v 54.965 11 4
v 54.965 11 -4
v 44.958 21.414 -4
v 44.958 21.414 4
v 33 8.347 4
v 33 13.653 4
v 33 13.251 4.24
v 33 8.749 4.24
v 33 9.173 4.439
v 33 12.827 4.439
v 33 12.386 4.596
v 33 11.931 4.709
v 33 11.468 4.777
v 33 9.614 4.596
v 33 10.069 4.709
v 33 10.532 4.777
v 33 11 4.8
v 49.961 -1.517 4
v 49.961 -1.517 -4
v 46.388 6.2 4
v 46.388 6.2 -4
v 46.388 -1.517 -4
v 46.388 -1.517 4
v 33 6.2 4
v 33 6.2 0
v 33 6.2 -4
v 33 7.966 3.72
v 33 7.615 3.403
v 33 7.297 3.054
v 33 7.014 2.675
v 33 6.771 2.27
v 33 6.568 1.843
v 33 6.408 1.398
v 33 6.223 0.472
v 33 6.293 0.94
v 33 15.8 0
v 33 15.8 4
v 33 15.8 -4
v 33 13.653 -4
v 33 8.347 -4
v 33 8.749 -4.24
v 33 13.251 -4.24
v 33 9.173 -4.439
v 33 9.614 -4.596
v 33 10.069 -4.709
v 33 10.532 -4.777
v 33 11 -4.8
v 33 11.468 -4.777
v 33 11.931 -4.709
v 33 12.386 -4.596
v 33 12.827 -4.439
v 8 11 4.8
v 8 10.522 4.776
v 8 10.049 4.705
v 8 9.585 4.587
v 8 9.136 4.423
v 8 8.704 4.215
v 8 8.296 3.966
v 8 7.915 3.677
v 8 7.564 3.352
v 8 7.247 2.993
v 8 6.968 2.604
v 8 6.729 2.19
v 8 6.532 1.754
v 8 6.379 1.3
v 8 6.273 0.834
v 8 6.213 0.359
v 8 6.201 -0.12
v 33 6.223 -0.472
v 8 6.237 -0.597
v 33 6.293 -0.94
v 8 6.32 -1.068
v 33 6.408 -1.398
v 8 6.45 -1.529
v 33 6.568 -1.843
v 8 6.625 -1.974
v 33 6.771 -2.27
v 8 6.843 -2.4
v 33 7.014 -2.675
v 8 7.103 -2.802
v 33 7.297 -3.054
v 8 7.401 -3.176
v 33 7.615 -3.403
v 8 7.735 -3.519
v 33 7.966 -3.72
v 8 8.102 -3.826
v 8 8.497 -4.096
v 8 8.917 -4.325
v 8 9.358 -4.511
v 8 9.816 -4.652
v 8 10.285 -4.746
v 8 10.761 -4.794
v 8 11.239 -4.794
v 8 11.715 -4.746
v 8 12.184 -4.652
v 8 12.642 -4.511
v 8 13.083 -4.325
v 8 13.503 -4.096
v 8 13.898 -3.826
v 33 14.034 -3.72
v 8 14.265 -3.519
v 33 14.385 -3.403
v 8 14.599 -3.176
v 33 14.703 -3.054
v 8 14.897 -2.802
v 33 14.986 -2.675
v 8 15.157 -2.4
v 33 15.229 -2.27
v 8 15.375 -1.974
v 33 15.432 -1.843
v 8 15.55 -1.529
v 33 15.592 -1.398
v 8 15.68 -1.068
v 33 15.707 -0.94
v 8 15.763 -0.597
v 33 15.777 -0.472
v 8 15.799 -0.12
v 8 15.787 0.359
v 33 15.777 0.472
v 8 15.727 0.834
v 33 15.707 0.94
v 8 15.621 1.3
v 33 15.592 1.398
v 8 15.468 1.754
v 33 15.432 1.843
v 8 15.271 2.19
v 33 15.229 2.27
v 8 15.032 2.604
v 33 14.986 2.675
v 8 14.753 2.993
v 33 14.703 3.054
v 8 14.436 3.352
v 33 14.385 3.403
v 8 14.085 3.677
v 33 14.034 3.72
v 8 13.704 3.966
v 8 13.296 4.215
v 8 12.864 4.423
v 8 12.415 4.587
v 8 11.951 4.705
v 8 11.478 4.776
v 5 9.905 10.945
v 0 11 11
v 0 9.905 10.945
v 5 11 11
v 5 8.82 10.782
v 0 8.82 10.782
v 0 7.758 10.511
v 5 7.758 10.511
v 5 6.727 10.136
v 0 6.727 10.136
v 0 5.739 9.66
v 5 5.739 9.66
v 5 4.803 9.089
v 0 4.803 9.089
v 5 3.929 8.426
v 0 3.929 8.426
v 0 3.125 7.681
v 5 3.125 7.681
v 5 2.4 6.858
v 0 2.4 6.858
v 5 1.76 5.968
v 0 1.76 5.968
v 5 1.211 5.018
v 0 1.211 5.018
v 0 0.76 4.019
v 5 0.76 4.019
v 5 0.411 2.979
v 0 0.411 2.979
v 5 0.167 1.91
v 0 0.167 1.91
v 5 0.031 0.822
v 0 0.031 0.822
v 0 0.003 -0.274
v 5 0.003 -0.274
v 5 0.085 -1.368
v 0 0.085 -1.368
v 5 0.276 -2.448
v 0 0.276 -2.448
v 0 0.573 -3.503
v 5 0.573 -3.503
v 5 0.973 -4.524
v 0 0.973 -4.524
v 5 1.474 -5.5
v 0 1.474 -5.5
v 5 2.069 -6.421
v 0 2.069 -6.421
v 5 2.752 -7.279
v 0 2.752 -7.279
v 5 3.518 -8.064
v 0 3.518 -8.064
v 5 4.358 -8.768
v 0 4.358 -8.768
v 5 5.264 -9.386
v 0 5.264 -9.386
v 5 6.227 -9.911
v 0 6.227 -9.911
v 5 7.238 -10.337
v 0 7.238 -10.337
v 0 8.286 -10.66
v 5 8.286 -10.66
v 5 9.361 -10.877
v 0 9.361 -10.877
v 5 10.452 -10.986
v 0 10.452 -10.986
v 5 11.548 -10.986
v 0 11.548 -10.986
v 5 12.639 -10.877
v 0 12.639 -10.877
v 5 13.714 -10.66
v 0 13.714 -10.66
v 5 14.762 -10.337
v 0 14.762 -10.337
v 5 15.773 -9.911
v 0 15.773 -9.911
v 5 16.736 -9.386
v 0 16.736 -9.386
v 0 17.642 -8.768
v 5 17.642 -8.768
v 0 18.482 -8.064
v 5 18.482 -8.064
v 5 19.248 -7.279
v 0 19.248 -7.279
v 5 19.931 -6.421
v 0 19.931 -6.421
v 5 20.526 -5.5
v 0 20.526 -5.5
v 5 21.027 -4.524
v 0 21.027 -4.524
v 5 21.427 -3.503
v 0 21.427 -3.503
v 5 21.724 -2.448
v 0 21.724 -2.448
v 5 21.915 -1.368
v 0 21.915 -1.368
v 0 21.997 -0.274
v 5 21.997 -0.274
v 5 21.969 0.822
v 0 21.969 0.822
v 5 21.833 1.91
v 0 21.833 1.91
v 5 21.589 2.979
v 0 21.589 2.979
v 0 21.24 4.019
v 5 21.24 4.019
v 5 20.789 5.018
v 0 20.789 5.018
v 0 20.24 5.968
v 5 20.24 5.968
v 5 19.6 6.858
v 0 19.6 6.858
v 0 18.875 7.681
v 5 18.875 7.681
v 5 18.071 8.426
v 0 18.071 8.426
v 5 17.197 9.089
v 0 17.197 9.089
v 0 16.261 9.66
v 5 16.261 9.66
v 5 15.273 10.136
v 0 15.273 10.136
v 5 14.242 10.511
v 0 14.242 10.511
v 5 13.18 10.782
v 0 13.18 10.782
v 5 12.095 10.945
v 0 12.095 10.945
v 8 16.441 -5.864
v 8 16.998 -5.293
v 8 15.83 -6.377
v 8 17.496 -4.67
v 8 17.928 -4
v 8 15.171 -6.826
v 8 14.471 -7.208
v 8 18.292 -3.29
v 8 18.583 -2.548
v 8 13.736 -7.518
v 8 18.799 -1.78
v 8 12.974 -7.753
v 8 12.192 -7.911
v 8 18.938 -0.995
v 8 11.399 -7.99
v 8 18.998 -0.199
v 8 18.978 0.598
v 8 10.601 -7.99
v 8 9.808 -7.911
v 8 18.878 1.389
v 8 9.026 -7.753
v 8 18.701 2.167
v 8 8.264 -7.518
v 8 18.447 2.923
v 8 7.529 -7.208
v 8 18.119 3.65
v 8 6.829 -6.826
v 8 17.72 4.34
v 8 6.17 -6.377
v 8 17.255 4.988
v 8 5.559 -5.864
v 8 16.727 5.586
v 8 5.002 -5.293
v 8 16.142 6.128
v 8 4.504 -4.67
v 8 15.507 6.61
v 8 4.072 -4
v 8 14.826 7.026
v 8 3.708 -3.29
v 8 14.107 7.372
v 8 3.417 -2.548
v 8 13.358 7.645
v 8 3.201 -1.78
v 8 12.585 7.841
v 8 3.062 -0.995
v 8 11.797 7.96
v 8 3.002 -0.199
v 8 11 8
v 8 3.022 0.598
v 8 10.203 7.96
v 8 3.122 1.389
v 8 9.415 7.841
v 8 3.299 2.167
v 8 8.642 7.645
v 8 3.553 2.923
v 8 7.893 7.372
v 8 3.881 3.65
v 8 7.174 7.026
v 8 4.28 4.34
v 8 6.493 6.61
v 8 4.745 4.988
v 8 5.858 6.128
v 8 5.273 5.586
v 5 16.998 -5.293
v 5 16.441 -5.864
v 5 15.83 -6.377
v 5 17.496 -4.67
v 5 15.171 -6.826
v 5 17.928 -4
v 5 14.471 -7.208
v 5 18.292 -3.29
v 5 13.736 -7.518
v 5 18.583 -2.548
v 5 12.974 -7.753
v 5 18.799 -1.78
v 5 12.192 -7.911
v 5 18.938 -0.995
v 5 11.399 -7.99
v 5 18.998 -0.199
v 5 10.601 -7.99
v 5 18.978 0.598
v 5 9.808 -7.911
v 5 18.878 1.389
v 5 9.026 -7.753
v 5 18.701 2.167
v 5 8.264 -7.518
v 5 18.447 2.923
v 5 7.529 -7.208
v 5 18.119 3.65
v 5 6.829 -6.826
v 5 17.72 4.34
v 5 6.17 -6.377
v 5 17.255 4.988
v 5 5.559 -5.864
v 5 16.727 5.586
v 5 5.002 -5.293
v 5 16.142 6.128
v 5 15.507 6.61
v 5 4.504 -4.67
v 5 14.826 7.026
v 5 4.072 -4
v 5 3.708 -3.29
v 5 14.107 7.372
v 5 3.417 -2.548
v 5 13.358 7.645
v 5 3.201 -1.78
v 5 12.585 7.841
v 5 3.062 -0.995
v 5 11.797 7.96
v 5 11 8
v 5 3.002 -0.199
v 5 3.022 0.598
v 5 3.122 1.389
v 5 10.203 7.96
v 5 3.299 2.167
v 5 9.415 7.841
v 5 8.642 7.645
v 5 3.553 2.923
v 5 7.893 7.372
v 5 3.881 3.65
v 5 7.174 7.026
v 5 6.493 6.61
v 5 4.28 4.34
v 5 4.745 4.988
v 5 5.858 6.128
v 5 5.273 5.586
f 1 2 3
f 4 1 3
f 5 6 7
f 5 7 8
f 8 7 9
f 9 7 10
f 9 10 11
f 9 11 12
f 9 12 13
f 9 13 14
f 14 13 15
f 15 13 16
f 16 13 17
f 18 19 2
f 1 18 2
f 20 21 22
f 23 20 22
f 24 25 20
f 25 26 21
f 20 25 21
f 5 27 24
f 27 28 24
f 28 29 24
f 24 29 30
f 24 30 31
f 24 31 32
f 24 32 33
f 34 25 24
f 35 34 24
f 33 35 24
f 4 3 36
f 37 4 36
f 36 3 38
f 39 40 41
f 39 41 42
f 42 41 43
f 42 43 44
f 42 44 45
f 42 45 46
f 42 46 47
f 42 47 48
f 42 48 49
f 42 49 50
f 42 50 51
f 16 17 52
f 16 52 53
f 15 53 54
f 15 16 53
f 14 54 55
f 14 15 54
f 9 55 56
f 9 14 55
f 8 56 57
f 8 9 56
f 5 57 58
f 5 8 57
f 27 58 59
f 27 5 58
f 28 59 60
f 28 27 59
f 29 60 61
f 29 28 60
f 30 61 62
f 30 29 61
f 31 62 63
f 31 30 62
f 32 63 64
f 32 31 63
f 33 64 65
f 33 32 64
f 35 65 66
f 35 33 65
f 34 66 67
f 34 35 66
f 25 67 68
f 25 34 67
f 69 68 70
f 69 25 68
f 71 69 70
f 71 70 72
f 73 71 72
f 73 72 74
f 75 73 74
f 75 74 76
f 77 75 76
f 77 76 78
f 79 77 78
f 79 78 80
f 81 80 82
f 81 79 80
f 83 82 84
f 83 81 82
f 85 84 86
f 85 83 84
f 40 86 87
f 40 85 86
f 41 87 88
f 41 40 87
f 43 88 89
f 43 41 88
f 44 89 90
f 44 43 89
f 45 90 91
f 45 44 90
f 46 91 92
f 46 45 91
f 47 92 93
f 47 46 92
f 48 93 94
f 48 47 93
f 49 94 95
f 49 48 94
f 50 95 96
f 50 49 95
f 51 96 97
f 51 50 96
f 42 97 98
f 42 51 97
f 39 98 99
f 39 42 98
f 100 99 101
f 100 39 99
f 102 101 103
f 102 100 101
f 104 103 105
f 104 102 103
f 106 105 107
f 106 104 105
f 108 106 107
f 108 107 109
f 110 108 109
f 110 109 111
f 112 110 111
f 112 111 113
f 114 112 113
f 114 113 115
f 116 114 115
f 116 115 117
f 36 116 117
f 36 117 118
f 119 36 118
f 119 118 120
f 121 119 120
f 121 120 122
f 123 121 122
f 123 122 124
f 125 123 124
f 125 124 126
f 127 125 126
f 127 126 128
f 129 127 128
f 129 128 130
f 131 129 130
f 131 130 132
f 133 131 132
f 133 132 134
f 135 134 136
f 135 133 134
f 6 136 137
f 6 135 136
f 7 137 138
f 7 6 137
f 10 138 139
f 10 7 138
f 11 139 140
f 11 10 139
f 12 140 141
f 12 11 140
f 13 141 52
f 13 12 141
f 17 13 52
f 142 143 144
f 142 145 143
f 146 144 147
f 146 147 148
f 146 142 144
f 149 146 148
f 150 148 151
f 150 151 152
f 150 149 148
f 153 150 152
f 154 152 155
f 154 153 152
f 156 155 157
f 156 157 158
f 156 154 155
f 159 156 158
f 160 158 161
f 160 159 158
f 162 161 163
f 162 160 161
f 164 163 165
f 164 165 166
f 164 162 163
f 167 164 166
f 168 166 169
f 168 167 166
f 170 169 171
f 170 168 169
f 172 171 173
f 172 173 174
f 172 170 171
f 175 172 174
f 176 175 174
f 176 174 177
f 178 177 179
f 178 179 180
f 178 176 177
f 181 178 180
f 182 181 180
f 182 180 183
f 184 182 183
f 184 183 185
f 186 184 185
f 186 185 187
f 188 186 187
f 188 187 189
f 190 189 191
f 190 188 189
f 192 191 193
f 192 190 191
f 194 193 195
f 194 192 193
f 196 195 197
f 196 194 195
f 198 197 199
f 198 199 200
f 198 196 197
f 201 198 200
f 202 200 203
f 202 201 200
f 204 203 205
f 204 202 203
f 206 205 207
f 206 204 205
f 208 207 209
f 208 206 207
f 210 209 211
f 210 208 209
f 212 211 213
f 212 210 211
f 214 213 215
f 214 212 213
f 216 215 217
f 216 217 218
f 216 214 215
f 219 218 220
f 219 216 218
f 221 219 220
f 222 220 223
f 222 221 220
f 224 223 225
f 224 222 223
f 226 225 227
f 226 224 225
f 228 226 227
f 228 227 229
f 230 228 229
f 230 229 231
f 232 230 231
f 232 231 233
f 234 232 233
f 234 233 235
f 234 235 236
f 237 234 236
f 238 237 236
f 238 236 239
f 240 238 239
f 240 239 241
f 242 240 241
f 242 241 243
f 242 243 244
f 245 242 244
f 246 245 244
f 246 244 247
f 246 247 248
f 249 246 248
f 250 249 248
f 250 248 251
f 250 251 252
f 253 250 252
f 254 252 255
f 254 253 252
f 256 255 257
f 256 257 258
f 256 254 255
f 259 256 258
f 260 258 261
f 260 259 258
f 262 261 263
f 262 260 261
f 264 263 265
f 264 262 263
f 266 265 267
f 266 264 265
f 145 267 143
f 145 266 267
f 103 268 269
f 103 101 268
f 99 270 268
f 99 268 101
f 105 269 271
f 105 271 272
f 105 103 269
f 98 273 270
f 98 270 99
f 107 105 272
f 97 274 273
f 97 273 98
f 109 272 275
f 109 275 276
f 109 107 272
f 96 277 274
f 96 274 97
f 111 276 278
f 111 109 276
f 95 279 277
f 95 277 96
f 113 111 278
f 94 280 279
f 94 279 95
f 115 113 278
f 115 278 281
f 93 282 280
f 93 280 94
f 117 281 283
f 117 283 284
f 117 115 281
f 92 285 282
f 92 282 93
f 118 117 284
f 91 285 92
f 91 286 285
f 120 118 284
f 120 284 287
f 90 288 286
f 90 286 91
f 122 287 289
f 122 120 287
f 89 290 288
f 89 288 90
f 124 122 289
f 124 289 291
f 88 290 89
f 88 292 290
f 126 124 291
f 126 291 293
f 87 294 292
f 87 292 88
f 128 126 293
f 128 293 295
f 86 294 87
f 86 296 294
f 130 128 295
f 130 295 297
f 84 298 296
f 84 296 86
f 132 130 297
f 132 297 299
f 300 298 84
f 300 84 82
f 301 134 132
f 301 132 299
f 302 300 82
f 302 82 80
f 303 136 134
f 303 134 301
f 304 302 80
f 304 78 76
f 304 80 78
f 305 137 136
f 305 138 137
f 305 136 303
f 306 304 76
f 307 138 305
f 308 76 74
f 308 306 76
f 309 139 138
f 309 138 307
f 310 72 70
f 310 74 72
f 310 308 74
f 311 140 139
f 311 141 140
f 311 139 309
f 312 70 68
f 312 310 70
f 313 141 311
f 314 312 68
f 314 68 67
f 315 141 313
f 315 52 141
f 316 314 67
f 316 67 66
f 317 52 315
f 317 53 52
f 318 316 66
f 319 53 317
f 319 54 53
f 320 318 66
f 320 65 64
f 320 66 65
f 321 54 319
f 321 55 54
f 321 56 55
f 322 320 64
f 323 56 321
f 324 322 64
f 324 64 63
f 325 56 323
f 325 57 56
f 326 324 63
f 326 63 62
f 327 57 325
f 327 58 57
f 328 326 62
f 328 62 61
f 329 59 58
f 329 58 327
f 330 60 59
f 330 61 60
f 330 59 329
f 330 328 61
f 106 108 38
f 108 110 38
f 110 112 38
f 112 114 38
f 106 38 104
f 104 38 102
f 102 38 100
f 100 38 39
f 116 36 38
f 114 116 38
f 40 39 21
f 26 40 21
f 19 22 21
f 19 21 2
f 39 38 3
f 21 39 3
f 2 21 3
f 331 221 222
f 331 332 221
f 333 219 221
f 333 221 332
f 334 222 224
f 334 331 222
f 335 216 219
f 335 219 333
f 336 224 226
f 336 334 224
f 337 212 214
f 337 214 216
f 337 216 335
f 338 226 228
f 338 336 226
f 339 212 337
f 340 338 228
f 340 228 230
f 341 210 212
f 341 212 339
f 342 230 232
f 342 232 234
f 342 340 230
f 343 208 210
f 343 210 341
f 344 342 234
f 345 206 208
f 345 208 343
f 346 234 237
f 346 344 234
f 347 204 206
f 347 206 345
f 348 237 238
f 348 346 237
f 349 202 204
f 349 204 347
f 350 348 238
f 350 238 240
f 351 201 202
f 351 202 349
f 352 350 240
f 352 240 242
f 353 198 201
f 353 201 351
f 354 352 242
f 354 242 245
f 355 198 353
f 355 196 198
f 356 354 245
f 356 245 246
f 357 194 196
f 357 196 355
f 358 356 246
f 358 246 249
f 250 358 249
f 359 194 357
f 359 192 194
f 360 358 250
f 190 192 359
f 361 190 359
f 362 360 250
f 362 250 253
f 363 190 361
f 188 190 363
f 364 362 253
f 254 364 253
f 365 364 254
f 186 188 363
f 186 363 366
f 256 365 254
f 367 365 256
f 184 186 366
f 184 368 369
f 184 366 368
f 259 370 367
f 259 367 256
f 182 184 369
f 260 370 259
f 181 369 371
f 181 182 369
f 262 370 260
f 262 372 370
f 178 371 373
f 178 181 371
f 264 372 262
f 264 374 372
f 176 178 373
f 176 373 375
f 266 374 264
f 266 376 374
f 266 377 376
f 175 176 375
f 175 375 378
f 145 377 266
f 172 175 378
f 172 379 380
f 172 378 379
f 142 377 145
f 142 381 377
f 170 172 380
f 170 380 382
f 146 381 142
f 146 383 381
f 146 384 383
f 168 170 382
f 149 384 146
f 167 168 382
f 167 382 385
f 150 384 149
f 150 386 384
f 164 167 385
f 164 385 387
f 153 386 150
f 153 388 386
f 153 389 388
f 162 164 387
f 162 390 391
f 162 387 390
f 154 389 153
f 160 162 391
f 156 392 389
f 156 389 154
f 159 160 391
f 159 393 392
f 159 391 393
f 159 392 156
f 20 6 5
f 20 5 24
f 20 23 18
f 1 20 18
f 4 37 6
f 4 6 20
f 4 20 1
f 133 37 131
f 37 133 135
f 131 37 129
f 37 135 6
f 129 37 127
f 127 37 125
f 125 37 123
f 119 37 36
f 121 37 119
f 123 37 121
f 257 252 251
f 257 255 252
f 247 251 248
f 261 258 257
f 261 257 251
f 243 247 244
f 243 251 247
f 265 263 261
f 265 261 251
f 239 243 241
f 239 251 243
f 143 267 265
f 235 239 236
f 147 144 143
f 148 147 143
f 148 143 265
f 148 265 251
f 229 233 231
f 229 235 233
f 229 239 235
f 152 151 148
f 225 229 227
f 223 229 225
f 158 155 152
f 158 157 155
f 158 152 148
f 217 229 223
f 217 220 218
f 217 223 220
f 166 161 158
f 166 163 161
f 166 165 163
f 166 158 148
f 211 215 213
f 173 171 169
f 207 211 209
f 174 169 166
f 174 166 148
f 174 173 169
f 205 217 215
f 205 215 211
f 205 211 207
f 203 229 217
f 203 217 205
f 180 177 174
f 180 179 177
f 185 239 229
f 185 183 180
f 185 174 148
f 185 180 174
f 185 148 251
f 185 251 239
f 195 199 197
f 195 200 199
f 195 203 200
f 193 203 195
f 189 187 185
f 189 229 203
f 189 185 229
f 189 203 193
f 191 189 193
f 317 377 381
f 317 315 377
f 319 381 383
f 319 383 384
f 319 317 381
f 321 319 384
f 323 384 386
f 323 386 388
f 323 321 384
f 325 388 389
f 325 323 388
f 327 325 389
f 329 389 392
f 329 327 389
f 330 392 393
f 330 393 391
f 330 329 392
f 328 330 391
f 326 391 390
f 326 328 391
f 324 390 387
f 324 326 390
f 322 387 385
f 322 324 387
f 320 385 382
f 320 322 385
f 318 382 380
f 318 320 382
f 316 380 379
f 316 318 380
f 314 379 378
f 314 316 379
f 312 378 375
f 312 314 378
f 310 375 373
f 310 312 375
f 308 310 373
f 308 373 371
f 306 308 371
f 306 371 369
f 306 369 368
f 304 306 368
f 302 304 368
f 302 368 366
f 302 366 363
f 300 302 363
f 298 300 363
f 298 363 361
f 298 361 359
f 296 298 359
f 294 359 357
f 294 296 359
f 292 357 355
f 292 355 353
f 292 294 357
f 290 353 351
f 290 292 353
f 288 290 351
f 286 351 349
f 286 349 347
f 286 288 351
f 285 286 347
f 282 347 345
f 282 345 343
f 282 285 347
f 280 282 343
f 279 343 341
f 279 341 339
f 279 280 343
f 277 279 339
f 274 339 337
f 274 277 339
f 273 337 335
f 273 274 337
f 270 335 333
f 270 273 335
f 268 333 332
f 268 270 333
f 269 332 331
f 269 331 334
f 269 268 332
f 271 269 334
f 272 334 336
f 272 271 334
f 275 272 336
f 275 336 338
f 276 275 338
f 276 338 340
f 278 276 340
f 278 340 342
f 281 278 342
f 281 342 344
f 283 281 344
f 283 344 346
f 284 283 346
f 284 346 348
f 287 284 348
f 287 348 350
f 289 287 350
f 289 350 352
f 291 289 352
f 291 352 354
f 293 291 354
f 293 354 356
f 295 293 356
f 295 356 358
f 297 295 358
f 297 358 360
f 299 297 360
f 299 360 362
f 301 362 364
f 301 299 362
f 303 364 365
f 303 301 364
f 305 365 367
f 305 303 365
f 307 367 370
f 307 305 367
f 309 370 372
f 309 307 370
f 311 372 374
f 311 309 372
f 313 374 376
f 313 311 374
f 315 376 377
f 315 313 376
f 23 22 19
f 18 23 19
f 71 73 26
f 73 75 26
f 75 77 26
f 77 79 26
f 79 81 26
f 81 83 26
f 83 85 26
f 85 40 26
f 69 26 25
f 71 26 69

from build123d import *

# Parameters (mm, degrees)
EXTRUDE_1_DEPTH      = 4
EXTRUDE_1_DEPTH_BACK = 4


with BuildPart() as part:
    # Эскиз1 → Повернуть1 (revolve)
    with BuildSketch(Plane.XY):
        Polygon((0, 11), (0, 0), (5, 0), (5, 3), (8, 3), (8, 6.2), (33, 6.2), (33, 11), align=None)
    revolve(axis=Axis((0, 11, 0), (1, 0, 0)))

    # Эскиз1<3> → Бобышка-Вытянуть1 (add, two sides: drawn at the far end of the back side and taken through both)
    with BuildSketch(Plane.XY.offset(-EXTRUDE_1_DEPTH_BACK)):
        Polygon((33, 15.8), (33, 6.2), (46.388094458, 6.2), (46.388094458, -1.517423247), (49.961353524, -1.517423247), (54.964630107, 11), (44.95807694, 21.414261094), align=None)
    extrude(amount=EXTRUDE_1_DEPTH + EXTRUDE_1_DEPTH_BACK)


solid = part.part
